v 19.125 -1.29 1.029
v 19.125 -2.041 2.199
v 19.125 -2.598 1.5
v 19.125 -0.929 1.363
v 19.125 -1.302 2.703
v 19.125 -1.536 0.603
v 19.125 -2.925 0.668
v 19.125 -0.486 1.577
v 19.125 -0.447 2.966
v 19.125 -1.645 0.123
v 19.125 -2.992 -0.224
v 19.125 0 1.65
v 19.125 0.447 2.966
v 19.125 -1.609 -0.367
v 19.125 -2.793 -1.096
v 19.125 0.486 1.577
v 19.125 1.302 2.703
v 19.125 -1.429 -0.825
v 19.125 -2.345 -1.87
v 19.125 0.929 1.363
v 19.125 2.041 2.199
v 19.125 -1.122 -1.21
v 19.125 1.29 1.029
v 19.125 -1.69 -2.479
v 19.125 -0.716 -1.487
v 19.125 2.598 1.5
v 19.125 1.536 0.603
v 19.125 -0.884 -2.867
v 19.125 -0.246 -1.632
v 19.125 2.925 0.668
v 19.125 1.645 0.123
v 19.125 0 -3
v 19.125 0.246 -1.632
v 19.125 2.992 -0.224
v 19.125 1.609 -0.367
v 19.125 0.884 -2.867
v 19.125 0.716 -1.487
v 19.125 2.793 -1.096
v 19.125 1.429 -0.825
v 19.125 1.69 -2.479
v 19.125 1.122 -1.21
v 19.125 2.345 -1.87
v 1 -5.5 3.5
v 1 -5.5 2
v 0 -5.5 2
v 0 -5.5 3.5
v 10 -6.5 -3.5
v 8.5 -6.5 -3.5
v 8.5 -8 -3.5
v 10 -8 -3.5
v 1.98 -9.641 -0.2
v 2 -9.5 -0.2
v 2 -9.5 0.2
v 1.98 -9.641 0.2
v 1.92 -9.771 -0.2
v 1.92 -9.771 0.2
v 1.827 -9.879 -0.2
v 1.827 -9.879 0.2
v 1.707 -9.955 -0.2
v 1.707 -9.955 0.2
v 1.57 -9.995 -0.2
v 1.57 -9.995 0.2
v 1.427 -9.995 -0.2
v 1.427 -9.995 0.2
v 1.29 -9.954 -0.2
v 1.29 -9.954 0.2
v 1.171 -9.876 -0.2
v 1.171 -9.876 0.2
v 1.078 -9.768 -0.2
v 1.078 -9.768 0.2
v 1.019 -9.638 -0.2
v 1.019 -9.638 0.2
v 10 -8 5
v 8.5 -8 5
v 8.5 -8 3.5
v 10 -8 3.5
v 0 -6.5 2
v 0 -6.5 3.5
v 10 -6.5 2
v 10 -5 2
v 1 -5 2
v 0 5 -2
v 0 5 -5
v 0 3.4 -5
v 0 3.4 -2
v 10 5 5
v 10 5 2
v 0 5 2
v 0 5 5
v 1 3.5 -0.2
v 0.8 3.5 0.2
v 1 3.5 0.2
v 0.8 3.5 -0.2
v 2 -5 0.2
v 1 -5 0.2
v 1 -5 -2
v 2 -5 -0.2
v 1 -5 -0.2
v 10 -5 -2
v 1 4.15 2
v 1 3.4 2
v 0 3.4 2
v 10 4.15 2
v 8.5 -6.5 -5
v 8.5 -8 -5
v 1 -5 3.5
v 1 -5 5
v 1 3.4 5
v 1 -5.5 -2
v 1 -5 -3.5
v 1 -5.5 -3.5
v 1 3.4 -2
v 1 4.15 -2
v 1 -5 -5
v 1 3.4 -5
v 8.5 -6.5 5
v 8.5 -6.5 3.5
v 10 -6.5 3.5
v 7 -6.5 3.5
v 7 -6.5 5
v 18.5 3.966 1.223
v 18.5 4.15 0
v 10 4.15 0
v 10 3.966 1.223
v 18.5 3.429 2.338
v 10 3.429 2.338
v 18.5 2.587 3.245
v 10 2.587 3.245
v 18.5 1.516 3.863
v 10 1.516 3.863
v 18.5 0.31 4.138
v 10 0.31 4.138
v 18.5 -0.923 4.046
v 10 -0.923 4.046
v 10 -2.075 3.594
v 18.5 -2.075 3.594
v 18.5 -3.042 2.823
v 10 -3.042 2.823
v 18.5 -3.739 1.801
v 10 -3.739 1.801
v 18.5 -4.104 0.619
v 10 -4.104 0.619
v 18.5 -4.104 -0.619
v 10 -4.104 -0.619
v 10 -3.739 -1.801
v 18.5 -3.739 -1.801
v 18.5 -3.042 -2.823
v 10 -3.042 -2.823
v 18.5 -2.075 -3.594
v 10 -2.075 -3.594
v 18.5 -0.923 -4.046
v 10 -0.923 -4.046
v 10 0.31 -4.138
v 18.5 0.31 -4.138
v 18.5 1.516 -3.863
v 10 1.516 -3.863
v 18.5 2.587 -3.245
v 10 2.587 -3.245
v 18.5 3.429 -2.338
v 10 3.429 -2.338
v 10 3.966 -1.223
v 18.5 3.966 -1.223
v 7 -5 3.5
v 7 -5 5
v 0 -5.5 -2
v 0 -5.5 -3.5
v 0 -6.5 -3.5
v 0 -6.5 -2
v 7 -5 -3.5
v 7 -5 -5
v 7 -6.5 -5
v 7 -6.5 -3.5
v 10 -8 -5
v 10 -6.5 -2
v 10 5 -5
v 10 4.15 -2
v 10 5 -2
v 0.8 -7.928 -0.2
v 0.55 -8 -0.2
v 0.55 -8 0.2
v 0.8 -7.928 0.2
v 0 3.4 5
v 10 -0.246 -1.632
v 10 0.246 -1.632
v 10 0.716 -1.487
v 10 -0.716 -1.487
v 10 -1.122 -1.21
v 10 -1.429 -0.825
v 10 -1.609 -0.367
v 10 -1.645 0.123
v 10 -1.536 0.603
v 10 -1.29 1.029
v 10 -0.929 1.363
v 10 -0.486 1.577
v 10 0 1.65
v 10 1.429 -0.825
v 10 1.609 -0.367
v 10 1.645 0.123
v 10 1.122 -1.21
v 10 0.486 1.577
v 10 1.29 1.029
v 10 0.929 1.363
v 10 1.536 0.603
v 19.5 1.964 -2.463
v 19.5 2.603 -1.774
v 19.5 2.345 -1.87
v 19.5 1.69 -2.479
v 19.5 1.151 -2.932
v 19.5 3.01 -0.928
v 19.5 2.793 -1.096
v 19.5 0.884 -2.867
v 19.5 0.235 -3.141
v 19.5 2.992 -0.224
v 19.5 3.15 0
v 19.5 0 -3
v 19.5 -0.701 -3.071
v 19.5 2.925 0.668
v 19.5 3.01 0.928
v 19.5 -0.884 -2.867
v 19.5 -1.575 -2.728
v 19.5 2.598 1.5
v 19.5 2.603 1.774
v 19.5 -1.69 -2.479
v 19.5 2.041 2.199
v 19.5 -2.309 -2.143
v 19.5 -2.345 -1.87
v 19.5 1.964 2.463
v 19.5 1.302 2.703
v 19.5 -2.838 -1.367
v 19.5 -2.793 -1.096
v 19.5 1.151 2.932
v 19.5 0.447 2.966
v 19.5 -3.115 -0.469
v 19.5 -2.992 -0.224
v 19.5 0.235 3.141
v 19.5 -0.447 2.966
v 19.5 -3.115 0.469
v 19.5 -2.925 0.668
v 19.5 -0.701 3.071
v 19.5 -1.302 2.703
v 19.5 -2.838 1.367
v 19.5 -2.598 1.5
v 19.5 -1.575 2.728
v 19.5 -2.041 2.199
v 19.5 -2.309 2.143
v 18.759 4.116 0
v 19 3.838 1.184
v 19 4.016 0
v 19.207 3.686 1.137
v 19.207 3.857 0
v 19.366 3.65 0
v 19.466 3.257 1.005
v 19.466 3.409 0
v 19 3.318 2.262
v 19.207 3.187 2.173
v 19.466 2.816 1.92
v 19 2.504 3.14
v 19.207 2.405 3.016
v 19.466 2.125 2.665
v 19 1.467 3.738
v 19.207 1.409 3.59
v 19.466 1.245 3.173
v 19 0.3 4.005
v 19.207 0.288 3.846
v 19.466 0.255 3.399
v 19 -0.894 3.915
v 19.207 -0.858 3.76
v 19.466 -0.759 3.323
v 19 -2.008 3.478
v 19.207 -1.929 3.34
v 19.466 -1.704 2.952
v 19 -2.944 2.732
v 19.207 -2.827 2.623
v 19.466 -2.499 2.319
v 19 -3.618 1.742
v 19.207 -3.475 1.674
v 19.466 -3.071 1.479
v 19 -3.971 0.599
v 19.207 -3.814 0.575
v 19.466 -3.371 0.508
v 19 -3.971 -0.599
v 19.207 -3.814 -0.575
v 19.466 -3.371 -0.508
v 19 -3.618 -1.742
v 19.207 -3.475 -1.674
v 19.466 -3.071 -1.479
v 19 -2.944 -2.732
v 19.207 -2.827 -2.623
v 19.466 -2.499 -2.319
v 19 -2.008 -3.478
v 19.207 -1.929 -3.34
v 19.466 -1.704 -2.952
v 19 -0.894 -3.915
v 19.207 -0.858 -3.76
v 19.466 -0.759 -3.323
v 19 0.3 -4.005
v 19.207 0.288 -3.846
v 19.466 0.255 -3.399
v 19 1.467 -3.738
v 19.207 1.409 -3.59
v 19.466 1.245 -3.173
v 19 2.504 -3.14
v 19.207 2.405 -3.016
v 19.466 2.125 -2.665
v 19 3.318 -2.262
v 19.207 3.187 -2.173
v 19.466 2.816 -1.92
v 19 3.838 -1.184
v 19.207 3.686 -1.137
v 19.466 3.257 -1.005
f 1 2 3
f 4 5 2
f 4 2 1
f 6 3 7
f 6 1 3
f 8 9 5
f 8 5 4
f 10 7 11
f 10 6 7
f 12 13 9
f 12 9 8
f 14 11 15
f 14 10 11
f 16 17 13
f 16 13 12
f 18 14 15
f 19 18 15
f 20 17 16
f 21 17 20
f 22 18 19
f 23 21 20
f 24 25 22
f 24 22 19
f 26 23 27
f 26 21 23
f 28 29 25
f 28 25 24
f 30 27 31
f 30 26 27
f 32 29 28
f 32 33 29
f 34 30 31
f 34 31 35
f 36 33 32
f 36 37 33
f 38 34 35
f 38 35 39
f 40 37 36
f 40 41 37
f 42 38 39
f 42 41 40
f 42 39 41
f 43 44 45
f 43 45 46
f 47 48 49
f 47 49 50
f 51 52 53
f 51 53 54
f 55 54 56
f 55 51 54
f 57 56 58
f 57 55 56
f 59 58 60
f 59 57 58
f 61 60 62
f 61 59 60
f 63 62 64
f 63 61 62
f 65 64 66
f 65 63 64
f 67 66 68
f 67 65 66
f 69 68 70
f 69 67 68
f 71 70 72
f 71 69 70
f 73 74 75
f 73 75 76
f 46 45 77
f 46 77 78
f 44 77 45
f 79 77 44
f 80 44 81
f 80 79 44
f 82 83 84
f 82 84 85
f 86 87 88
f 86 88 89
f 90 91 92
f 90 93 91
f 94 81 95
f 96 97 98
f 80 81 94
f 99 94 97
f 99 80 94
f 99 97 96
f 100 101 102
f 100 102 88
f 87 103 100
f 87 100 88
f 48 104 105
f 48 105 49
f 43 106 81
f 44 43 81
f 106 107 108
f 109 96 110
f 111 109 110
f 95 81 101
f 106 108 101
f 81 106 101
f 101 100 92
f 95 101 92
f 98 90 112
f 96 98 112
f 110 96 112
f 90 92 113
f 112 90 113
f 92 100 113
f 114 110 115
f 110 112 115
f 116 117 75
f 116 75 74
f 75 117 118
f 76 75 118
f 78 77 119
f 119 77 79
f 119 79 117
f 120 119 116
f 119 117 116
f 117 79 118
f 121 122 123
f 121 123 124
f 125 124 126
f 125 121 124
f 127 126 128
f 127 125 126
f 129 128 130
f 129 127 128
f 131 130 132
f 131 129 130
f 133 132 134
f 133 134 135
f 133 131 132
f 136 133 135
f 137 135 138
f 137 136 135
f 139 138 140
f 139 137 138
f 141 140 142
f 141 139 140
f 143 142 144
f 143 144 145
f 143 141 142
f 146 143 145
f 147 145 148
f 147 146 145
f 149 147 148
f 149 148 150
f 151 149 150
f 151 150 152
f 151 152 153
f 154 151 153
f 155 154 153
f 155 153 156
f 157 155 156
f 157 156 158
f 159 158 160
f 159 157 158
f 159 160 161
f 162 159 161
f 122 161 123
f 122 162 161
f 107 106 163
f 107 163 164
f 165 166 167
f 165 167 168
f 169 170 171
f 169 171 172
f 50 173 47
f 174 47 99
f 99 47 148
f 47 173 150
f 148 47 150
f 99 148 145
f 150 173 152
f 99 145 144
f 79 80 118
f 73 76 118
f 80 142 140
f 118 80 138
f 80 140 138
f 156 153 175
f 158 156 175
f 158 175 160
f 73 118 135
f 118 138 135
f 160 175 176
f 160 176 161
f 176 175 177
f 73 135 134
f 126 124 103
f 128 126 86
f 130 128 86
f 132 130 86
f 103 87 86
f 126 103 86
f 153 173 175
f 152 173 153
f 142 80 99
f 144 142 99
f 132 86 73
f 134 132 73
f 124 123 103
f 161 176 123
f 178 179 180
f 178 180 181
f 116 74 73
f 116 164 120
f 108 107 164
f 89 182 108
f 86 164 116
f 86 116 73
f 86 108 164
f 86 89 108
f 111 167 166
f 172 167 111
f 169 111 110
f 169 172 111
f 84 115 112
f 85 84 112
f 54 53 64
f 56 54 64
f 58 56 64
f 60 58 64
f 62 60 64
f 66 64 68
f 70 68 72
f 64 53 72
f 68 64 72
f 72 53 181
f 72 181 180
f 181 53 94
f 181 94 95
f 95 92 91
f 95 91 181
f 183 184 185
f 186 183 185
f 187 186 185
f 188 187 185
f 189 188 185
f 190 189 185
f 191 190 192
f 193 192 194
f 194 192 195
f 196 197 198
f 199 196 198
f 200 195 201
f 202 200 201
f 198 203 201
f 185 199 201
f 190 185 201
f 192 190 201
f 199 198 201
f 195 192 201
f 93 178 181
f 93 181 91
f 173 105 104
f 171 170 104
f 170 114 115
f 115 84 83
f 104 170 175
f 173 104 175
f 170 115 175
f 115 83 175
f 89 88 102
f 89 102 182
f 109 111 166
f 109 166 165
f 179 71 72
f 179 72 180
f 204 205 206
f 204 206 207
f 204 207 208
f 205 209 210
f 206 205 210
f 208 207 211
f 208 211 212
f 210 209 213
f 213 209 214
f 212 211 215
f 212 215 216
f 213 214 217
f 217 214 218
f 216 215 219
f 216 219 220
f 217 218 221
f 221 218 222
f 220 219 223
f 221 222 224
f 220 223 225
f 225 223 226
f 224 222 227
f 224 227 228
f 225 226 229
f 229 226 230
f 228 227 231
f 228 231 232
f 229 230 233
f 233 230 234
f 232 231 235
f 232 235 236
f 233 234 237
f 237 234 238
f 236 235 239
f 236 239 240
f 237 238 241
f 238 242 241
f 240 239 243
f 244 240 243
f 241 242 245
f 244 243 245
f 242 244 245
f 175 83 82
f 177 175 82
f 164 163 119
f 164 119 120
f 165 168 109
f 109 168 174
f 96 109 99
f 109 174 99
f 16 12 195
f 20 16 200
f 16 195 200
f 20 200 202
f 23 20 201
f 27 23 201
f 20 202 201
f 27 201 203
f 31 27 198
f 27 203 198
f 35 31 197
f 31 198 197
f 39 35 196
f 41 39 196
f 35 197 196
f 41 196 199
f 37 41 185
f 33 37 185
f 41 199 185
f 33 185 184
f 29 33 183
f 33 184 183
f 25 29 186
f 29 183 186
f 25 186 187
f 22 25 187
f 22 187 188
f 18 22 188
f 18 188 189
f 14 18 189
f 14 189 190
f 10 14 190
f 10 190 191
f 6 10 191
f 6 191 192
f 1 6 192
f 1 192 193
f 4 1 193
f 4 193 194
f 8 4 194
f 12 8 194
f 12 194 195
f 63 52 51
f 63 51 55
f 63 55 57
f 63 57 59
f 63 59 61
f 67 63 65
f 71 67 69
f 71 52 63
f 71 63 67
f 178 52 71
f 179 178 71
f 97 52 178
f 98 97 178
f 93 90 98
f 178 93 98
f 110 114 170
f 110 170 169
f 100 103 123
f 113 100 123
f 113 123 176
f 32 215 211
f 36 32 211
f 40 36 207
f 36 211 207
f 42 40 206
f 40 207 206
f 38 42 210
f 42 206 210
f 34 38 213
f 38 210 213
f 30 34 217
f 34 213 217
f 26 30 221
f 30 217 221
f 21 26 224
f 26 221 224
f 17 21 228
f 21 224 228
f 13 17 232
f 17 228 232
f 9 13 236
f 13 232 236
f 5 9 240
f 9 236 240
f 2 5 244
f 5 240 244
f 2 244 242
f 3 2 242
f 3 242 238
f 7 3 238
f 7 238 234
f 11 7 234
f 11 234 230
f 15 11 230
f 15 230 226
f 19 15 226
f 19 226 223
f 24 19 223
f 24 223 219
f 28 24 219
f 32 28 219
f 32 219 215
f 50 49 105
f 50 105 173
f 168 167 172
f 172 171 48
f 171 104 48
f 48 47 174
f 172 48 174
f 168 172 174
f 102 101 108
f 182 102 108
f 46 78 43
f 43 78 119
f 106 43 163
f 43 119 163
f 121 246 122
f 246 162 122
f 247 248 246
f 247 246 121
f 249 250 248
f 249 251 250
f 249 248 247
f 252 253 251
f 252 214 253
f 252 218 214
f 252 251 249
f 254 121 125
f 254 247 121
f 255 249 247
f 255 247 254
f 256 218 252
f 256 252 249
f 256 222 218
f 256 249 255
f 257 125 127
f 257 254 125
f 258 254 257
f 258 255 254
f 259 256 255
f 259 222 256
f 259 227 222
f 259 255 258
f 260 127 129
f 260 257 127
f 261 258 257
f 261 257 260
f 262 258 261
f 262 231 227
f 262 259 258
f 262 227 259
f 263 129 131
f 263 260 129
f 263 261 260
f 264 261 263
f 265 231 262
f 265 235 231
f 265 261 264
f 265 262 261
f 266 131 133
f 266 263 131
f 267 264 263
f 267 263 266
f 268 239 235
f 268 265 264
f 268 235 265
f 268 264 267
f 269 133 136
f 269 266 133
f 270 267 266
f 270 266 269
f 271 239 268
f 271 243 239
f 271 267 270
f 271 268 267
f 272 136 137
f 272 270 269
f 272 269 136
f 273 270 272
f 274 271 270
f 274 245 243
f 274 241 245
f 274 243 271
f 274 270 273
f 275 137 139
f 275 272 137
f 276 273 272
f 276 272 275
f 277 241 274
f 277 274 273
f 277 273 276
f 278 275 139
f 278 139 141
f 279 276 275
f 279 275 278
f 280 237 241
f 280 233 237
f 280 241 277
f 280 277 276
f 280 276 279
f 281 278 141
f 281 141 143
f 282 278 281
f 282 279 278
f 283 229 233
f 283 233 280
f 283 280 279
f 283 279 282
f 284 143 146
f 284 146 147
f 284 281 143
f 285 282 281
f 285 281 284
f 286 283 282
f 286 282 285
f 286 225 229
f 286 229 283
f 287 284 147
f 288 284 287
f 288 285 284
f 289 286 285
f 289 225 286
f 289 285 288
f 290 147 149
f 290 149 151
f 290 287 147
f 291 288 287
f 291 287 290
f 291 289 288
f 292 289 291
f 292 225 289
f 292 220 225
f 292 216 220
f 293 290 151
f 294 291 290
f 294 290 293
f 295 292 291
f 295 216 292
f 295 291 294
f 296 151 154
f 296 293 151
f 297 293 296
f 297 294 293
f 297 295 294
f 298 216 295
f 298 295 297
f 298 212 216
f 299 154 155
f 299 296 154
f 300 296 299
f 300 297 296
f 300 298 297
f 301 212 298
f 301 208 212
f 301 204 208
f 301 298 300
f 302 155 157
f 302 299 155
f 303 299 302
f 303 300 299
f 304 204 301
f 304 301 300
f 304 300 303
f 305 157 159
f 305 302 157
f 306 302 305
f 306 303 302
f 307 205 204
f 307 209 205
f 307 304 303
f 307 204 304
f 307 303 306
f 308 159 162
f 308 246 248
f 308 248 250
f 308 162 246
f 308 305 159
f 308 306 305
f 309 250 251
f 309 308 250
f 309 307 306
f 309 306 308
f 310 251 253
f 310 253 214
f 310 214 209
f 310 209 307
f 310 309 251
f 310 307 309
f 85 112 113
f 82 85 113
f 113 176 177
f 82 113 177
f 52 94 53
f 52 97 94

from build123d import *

# Parameters (mm, degrees)
ESBO_O1_W                                            = 10
ESBO_O1_H                                            = 11.5
RESSALTO_EXTRUS_O1_DEPTH                             = 9
ESBO_O2_W                                            = 4
ESBO_O2_H                                            = 0.85
CORTE_EXTRUS_O1_DEPTH                                = 10
ESBO_O3_W                                            = 3
ESBO_O3_H                                            = 1.6
RESSALTO_EXTRUS_O2_DEPTH                             = 1
ESBO_O4_W                                            = 3
ESBO_O4_H                                            = 1.6
RESSALTO_EXTRUS_O3_DEPTH                             = 1
ESBO_O5_W                                            = 4
ESBO_O5_H                                            = 1.5
CORTE_EXTRUS_O2_DEPTH                                = 11
ESBO_O6_W                                            = 1.5
ESBO_O6_H                                            = 1
RESSALTO_EXTRUS_O4_DEPTH                             = 1
ESBO_O7_W                                            = 1.5
ESBO_O7_H                                            = 1.5
CORTE_EXTRUS_O3_DEPTH                                = 6
ESBO_O8_W                                            = 1.5
ESBO_O8_H                                            = 1
RESSALTO_EXTRUS_O5_DEPTH                             = 1
ESBO_O9_W                                            = 1.5
ESBO_O9_H                                            = 1.5
CORTE_EXTRUS_O4_DEPTH                                = 6
ESBO_O10_W                                           = 1.5
ESBO_O10_H                                           = 1.5
RESSALTO_EXTRUS_O6_DEPTH                             = 1.5
ESBO_O11_W                                           = 1.5
ESBO_O11_H                                           = 1.5
RESSALTO_EXTRUS_O7_DEPTH                             = 1.5
ESBO_O12_W                                           = 9.5
ESBO_O12_H                                           = 4.15
REBAIXO_PARA_PARAFUSO_DE_M_QUINA_DE_CABE_D           = 3.3
REBAIXO_PARA_PARAFUSO_DE_M_QUINA_DE_CABE_DEPTH       = 9.5
REBAIXO_PARA_PARAFUSO_DE_M_QUINA_DE_CABE_CBORE_D     = 6
REBAIXO_PARA_PARAFUSO_DE_M_QUINA_DE_CABE_CBORE_DEPTH = 0.375
FILETE1_R                                            = 1
RESSALTO_EXTRUS_O9_DEPTH                             = 0.2


with BuildPart() as part:
    # Esboço1 → Ressalto-extrusão1 (new body)
    with BuildSketch(Plane(origin=(10, 0, 0), x_dir=(0, 0, -1), z_dir=(1, 0, 0))):
        with Locations((0, -0.75)):
            Rectangle(ESBO_O1_W, ESBO_O1_H)
    extrude(amount=-RESSALTO_EXTRUS_O1_DEPTH)

    # Esboço2 → Corte-extrusão1 (cut, through all)
    with BuildSketch(Plane(origin=(10, 0, 0), x_dir=(0, 0, -1), z_dir=(1, 0, 0))):
        with Locations((0, 4.575)):
            Rectangle(ESBO_O2_W, ESBO_O2_H)
    extrude(amount=-CORTE_EXTRUS_O1_DEPTH, mode=Mode.SUBTRACT)

    # Esboço3 → Ressalto-extrusão2 (add)
    with BuildSketch(Plane.ZY.offset(-1)):
        with Locations((3.5, 4.2)):
            Rectangle(ESBO_O3_W, ESBO_O3_H)
    extrude(amount=RESSALTO_EXTRUS_O2_DEPTH)

    # Esboço4 → Ressalto-extrusão3 (add)
    with BuildSketch(Plane.ZY.offset(-1)):
        with Locations((-3.5, 4.2)):
            Rectangle(ESBO_O4_W, ESBO_O4_H)
    extrude(amount=RESSALTO_EXTRUS_O3_DEPTH)

    # Esboço5 → Corte-extrusão2 (cut, through all)
    with BuildSketch(Plane(origin=(10, 0, 0), x_dir=(0, 0, -1), z_dir=(1, 0, 0))):
        with Locations((0, -5.75)):
            Rectangle(ESBO_O5_W, ESBO_O5_H)
    extrude(amount=-CORTE_EXTRUS_O2_DEPTH, mode=Mode.SUBTRACT)

    # Esboço6 → Ressalto-extrusão4 (add)
    with BuildSketch(Plane.ZY.offset(-1)):
        with Locations((2.75, -6)):
            Rectangle(ESBO_O6_W, ESBO_O6_H)
    extrude(amount=RESSALTO_EXTRUS_O4_DEPTH)

    # Esboço7 → Corte-extrusão3 (cut)
    with BuildSketch(Plane.ZY.offset(-1)):
        with Locations((4.25, -5.75)):
            Rectangle(ESBO_O7_W, ESBO_O7_H)
    extrude(amount=-CORTE_EXTRUS_O3_DEPTH, mode=Mode.SUBTRACT)

    # Esboço8 → Ressalto-extrusão5 (add)
    with BuildSketch(Plane.ZY.offset(-1)):
        with Locations((-2.75, -6)):
            Rectangle(ESBO_O8_W, ESBO_O8_H)
    extrude(amount=RESSALTO_EXTRUS_O5_DEPTH)

    # Esboço9 → Corte-extrusão4 (cut)
    with BuildSketch(Plane.ZY.offset(-1)):
        with Locations((-4.25, -5.75)):
            Rectangle(ESBO_O9_W, ESBO_O9_H)
    extrude(amount=-CORTE_EXTRUS_O4_DEPTH, mode=Mode.SUBTRACT)

    # Esboço10 → Ressalto-extrusão6 (add)
    with BuildSketch(Plane.XZ.offset(6.5)):
        with Locations((9.25, 4.25)):
            Rectangle(ESBO_O10_W, ESBO_O10_H)
    extrude(amount=RESSALTO_EXTRUS_O6_DEPTH)

    # Esboço11 → Ressalto-extrusão7 (add)
    with BuildSketch(Plane.XZ.offset(6.5)):
        with Locations((9.25, -4.25)):
            Rectangle(ESBO_O11_W, ESBO_O11_H)
    extrude(amount=RESSALTO_EXTRUS_O7_DEPTH)

    # Esboço12 → Revolução1 (revolve)
    with BuildSketch(Plane.XY):
        with Locations((14.75, 2.075)):
            Rectangle(ESBO_O12_W, ESBO_O12_H)
    revolve(axis=Axis((10, 0, 0), (1, 0, 0)))

    # Rebaixo para parafuso de máquina de cabeça sextavada de M31
    with Locations(Plane(origin=(19.5, 0, 0), x_dir=(0, 0, -1), z_dir=(1, 0, 0))):
        with Locations((0, 0)):
            CounterBoreHole(REBAIXO_PARA_PARAFUSO_DE_M_QUINA_DE_CABE_D / 2, REBAIXO_PARA_PARAFUSO_DE_M_QUINA_DE_CABE_CBORE_D / 2, REBAIXO_PARA_PARAFUSO_DE_M_QUINA_DE_CABE_CBORE_DEPTH, depth=REBAIXO_PARA_PARAFUSO_DE_M_QUINA_DE_CABE_DEPTH)

    # Filete1
    filete1_edges = [part.edges().sort_by_distance(p)[0] for p in [
        (19.5, -4.15, 0),
    ]]
    fillet(filete1_edges, radius=FILETE1_R)

    # Esboço16 → Ressalto-extrusão9 (add, symmetric)
    with BuildSketch(Plane(origin=(0, 0, 0), x_dir=(-1, 0, 0), z_dir=(0, 0, -1))):
        with BuildLine():
            Line((-2, -5), (-2, -9.5))
            ThreePointArc((-2, -9.5), (-1.569549144, -9.99513929), (-1.019348334, -9.637746055))
            Line((-1.019348334, -9.637746055), (-0.549999999, -8))
            Line((-0.549999999, -8), (-0.8, -7.928354531))
            Line((-0.8, -7.928354531), (-0.8, 3.5))
            Line((-0.8, 3.5), (-1, 3.5))
            Line((-1, 3.5), (-2, -5))
        make_face()
    extrude(amount=RESSALTO_EXTRUS_O9_DEPTH, both=True)


solid = part.part
